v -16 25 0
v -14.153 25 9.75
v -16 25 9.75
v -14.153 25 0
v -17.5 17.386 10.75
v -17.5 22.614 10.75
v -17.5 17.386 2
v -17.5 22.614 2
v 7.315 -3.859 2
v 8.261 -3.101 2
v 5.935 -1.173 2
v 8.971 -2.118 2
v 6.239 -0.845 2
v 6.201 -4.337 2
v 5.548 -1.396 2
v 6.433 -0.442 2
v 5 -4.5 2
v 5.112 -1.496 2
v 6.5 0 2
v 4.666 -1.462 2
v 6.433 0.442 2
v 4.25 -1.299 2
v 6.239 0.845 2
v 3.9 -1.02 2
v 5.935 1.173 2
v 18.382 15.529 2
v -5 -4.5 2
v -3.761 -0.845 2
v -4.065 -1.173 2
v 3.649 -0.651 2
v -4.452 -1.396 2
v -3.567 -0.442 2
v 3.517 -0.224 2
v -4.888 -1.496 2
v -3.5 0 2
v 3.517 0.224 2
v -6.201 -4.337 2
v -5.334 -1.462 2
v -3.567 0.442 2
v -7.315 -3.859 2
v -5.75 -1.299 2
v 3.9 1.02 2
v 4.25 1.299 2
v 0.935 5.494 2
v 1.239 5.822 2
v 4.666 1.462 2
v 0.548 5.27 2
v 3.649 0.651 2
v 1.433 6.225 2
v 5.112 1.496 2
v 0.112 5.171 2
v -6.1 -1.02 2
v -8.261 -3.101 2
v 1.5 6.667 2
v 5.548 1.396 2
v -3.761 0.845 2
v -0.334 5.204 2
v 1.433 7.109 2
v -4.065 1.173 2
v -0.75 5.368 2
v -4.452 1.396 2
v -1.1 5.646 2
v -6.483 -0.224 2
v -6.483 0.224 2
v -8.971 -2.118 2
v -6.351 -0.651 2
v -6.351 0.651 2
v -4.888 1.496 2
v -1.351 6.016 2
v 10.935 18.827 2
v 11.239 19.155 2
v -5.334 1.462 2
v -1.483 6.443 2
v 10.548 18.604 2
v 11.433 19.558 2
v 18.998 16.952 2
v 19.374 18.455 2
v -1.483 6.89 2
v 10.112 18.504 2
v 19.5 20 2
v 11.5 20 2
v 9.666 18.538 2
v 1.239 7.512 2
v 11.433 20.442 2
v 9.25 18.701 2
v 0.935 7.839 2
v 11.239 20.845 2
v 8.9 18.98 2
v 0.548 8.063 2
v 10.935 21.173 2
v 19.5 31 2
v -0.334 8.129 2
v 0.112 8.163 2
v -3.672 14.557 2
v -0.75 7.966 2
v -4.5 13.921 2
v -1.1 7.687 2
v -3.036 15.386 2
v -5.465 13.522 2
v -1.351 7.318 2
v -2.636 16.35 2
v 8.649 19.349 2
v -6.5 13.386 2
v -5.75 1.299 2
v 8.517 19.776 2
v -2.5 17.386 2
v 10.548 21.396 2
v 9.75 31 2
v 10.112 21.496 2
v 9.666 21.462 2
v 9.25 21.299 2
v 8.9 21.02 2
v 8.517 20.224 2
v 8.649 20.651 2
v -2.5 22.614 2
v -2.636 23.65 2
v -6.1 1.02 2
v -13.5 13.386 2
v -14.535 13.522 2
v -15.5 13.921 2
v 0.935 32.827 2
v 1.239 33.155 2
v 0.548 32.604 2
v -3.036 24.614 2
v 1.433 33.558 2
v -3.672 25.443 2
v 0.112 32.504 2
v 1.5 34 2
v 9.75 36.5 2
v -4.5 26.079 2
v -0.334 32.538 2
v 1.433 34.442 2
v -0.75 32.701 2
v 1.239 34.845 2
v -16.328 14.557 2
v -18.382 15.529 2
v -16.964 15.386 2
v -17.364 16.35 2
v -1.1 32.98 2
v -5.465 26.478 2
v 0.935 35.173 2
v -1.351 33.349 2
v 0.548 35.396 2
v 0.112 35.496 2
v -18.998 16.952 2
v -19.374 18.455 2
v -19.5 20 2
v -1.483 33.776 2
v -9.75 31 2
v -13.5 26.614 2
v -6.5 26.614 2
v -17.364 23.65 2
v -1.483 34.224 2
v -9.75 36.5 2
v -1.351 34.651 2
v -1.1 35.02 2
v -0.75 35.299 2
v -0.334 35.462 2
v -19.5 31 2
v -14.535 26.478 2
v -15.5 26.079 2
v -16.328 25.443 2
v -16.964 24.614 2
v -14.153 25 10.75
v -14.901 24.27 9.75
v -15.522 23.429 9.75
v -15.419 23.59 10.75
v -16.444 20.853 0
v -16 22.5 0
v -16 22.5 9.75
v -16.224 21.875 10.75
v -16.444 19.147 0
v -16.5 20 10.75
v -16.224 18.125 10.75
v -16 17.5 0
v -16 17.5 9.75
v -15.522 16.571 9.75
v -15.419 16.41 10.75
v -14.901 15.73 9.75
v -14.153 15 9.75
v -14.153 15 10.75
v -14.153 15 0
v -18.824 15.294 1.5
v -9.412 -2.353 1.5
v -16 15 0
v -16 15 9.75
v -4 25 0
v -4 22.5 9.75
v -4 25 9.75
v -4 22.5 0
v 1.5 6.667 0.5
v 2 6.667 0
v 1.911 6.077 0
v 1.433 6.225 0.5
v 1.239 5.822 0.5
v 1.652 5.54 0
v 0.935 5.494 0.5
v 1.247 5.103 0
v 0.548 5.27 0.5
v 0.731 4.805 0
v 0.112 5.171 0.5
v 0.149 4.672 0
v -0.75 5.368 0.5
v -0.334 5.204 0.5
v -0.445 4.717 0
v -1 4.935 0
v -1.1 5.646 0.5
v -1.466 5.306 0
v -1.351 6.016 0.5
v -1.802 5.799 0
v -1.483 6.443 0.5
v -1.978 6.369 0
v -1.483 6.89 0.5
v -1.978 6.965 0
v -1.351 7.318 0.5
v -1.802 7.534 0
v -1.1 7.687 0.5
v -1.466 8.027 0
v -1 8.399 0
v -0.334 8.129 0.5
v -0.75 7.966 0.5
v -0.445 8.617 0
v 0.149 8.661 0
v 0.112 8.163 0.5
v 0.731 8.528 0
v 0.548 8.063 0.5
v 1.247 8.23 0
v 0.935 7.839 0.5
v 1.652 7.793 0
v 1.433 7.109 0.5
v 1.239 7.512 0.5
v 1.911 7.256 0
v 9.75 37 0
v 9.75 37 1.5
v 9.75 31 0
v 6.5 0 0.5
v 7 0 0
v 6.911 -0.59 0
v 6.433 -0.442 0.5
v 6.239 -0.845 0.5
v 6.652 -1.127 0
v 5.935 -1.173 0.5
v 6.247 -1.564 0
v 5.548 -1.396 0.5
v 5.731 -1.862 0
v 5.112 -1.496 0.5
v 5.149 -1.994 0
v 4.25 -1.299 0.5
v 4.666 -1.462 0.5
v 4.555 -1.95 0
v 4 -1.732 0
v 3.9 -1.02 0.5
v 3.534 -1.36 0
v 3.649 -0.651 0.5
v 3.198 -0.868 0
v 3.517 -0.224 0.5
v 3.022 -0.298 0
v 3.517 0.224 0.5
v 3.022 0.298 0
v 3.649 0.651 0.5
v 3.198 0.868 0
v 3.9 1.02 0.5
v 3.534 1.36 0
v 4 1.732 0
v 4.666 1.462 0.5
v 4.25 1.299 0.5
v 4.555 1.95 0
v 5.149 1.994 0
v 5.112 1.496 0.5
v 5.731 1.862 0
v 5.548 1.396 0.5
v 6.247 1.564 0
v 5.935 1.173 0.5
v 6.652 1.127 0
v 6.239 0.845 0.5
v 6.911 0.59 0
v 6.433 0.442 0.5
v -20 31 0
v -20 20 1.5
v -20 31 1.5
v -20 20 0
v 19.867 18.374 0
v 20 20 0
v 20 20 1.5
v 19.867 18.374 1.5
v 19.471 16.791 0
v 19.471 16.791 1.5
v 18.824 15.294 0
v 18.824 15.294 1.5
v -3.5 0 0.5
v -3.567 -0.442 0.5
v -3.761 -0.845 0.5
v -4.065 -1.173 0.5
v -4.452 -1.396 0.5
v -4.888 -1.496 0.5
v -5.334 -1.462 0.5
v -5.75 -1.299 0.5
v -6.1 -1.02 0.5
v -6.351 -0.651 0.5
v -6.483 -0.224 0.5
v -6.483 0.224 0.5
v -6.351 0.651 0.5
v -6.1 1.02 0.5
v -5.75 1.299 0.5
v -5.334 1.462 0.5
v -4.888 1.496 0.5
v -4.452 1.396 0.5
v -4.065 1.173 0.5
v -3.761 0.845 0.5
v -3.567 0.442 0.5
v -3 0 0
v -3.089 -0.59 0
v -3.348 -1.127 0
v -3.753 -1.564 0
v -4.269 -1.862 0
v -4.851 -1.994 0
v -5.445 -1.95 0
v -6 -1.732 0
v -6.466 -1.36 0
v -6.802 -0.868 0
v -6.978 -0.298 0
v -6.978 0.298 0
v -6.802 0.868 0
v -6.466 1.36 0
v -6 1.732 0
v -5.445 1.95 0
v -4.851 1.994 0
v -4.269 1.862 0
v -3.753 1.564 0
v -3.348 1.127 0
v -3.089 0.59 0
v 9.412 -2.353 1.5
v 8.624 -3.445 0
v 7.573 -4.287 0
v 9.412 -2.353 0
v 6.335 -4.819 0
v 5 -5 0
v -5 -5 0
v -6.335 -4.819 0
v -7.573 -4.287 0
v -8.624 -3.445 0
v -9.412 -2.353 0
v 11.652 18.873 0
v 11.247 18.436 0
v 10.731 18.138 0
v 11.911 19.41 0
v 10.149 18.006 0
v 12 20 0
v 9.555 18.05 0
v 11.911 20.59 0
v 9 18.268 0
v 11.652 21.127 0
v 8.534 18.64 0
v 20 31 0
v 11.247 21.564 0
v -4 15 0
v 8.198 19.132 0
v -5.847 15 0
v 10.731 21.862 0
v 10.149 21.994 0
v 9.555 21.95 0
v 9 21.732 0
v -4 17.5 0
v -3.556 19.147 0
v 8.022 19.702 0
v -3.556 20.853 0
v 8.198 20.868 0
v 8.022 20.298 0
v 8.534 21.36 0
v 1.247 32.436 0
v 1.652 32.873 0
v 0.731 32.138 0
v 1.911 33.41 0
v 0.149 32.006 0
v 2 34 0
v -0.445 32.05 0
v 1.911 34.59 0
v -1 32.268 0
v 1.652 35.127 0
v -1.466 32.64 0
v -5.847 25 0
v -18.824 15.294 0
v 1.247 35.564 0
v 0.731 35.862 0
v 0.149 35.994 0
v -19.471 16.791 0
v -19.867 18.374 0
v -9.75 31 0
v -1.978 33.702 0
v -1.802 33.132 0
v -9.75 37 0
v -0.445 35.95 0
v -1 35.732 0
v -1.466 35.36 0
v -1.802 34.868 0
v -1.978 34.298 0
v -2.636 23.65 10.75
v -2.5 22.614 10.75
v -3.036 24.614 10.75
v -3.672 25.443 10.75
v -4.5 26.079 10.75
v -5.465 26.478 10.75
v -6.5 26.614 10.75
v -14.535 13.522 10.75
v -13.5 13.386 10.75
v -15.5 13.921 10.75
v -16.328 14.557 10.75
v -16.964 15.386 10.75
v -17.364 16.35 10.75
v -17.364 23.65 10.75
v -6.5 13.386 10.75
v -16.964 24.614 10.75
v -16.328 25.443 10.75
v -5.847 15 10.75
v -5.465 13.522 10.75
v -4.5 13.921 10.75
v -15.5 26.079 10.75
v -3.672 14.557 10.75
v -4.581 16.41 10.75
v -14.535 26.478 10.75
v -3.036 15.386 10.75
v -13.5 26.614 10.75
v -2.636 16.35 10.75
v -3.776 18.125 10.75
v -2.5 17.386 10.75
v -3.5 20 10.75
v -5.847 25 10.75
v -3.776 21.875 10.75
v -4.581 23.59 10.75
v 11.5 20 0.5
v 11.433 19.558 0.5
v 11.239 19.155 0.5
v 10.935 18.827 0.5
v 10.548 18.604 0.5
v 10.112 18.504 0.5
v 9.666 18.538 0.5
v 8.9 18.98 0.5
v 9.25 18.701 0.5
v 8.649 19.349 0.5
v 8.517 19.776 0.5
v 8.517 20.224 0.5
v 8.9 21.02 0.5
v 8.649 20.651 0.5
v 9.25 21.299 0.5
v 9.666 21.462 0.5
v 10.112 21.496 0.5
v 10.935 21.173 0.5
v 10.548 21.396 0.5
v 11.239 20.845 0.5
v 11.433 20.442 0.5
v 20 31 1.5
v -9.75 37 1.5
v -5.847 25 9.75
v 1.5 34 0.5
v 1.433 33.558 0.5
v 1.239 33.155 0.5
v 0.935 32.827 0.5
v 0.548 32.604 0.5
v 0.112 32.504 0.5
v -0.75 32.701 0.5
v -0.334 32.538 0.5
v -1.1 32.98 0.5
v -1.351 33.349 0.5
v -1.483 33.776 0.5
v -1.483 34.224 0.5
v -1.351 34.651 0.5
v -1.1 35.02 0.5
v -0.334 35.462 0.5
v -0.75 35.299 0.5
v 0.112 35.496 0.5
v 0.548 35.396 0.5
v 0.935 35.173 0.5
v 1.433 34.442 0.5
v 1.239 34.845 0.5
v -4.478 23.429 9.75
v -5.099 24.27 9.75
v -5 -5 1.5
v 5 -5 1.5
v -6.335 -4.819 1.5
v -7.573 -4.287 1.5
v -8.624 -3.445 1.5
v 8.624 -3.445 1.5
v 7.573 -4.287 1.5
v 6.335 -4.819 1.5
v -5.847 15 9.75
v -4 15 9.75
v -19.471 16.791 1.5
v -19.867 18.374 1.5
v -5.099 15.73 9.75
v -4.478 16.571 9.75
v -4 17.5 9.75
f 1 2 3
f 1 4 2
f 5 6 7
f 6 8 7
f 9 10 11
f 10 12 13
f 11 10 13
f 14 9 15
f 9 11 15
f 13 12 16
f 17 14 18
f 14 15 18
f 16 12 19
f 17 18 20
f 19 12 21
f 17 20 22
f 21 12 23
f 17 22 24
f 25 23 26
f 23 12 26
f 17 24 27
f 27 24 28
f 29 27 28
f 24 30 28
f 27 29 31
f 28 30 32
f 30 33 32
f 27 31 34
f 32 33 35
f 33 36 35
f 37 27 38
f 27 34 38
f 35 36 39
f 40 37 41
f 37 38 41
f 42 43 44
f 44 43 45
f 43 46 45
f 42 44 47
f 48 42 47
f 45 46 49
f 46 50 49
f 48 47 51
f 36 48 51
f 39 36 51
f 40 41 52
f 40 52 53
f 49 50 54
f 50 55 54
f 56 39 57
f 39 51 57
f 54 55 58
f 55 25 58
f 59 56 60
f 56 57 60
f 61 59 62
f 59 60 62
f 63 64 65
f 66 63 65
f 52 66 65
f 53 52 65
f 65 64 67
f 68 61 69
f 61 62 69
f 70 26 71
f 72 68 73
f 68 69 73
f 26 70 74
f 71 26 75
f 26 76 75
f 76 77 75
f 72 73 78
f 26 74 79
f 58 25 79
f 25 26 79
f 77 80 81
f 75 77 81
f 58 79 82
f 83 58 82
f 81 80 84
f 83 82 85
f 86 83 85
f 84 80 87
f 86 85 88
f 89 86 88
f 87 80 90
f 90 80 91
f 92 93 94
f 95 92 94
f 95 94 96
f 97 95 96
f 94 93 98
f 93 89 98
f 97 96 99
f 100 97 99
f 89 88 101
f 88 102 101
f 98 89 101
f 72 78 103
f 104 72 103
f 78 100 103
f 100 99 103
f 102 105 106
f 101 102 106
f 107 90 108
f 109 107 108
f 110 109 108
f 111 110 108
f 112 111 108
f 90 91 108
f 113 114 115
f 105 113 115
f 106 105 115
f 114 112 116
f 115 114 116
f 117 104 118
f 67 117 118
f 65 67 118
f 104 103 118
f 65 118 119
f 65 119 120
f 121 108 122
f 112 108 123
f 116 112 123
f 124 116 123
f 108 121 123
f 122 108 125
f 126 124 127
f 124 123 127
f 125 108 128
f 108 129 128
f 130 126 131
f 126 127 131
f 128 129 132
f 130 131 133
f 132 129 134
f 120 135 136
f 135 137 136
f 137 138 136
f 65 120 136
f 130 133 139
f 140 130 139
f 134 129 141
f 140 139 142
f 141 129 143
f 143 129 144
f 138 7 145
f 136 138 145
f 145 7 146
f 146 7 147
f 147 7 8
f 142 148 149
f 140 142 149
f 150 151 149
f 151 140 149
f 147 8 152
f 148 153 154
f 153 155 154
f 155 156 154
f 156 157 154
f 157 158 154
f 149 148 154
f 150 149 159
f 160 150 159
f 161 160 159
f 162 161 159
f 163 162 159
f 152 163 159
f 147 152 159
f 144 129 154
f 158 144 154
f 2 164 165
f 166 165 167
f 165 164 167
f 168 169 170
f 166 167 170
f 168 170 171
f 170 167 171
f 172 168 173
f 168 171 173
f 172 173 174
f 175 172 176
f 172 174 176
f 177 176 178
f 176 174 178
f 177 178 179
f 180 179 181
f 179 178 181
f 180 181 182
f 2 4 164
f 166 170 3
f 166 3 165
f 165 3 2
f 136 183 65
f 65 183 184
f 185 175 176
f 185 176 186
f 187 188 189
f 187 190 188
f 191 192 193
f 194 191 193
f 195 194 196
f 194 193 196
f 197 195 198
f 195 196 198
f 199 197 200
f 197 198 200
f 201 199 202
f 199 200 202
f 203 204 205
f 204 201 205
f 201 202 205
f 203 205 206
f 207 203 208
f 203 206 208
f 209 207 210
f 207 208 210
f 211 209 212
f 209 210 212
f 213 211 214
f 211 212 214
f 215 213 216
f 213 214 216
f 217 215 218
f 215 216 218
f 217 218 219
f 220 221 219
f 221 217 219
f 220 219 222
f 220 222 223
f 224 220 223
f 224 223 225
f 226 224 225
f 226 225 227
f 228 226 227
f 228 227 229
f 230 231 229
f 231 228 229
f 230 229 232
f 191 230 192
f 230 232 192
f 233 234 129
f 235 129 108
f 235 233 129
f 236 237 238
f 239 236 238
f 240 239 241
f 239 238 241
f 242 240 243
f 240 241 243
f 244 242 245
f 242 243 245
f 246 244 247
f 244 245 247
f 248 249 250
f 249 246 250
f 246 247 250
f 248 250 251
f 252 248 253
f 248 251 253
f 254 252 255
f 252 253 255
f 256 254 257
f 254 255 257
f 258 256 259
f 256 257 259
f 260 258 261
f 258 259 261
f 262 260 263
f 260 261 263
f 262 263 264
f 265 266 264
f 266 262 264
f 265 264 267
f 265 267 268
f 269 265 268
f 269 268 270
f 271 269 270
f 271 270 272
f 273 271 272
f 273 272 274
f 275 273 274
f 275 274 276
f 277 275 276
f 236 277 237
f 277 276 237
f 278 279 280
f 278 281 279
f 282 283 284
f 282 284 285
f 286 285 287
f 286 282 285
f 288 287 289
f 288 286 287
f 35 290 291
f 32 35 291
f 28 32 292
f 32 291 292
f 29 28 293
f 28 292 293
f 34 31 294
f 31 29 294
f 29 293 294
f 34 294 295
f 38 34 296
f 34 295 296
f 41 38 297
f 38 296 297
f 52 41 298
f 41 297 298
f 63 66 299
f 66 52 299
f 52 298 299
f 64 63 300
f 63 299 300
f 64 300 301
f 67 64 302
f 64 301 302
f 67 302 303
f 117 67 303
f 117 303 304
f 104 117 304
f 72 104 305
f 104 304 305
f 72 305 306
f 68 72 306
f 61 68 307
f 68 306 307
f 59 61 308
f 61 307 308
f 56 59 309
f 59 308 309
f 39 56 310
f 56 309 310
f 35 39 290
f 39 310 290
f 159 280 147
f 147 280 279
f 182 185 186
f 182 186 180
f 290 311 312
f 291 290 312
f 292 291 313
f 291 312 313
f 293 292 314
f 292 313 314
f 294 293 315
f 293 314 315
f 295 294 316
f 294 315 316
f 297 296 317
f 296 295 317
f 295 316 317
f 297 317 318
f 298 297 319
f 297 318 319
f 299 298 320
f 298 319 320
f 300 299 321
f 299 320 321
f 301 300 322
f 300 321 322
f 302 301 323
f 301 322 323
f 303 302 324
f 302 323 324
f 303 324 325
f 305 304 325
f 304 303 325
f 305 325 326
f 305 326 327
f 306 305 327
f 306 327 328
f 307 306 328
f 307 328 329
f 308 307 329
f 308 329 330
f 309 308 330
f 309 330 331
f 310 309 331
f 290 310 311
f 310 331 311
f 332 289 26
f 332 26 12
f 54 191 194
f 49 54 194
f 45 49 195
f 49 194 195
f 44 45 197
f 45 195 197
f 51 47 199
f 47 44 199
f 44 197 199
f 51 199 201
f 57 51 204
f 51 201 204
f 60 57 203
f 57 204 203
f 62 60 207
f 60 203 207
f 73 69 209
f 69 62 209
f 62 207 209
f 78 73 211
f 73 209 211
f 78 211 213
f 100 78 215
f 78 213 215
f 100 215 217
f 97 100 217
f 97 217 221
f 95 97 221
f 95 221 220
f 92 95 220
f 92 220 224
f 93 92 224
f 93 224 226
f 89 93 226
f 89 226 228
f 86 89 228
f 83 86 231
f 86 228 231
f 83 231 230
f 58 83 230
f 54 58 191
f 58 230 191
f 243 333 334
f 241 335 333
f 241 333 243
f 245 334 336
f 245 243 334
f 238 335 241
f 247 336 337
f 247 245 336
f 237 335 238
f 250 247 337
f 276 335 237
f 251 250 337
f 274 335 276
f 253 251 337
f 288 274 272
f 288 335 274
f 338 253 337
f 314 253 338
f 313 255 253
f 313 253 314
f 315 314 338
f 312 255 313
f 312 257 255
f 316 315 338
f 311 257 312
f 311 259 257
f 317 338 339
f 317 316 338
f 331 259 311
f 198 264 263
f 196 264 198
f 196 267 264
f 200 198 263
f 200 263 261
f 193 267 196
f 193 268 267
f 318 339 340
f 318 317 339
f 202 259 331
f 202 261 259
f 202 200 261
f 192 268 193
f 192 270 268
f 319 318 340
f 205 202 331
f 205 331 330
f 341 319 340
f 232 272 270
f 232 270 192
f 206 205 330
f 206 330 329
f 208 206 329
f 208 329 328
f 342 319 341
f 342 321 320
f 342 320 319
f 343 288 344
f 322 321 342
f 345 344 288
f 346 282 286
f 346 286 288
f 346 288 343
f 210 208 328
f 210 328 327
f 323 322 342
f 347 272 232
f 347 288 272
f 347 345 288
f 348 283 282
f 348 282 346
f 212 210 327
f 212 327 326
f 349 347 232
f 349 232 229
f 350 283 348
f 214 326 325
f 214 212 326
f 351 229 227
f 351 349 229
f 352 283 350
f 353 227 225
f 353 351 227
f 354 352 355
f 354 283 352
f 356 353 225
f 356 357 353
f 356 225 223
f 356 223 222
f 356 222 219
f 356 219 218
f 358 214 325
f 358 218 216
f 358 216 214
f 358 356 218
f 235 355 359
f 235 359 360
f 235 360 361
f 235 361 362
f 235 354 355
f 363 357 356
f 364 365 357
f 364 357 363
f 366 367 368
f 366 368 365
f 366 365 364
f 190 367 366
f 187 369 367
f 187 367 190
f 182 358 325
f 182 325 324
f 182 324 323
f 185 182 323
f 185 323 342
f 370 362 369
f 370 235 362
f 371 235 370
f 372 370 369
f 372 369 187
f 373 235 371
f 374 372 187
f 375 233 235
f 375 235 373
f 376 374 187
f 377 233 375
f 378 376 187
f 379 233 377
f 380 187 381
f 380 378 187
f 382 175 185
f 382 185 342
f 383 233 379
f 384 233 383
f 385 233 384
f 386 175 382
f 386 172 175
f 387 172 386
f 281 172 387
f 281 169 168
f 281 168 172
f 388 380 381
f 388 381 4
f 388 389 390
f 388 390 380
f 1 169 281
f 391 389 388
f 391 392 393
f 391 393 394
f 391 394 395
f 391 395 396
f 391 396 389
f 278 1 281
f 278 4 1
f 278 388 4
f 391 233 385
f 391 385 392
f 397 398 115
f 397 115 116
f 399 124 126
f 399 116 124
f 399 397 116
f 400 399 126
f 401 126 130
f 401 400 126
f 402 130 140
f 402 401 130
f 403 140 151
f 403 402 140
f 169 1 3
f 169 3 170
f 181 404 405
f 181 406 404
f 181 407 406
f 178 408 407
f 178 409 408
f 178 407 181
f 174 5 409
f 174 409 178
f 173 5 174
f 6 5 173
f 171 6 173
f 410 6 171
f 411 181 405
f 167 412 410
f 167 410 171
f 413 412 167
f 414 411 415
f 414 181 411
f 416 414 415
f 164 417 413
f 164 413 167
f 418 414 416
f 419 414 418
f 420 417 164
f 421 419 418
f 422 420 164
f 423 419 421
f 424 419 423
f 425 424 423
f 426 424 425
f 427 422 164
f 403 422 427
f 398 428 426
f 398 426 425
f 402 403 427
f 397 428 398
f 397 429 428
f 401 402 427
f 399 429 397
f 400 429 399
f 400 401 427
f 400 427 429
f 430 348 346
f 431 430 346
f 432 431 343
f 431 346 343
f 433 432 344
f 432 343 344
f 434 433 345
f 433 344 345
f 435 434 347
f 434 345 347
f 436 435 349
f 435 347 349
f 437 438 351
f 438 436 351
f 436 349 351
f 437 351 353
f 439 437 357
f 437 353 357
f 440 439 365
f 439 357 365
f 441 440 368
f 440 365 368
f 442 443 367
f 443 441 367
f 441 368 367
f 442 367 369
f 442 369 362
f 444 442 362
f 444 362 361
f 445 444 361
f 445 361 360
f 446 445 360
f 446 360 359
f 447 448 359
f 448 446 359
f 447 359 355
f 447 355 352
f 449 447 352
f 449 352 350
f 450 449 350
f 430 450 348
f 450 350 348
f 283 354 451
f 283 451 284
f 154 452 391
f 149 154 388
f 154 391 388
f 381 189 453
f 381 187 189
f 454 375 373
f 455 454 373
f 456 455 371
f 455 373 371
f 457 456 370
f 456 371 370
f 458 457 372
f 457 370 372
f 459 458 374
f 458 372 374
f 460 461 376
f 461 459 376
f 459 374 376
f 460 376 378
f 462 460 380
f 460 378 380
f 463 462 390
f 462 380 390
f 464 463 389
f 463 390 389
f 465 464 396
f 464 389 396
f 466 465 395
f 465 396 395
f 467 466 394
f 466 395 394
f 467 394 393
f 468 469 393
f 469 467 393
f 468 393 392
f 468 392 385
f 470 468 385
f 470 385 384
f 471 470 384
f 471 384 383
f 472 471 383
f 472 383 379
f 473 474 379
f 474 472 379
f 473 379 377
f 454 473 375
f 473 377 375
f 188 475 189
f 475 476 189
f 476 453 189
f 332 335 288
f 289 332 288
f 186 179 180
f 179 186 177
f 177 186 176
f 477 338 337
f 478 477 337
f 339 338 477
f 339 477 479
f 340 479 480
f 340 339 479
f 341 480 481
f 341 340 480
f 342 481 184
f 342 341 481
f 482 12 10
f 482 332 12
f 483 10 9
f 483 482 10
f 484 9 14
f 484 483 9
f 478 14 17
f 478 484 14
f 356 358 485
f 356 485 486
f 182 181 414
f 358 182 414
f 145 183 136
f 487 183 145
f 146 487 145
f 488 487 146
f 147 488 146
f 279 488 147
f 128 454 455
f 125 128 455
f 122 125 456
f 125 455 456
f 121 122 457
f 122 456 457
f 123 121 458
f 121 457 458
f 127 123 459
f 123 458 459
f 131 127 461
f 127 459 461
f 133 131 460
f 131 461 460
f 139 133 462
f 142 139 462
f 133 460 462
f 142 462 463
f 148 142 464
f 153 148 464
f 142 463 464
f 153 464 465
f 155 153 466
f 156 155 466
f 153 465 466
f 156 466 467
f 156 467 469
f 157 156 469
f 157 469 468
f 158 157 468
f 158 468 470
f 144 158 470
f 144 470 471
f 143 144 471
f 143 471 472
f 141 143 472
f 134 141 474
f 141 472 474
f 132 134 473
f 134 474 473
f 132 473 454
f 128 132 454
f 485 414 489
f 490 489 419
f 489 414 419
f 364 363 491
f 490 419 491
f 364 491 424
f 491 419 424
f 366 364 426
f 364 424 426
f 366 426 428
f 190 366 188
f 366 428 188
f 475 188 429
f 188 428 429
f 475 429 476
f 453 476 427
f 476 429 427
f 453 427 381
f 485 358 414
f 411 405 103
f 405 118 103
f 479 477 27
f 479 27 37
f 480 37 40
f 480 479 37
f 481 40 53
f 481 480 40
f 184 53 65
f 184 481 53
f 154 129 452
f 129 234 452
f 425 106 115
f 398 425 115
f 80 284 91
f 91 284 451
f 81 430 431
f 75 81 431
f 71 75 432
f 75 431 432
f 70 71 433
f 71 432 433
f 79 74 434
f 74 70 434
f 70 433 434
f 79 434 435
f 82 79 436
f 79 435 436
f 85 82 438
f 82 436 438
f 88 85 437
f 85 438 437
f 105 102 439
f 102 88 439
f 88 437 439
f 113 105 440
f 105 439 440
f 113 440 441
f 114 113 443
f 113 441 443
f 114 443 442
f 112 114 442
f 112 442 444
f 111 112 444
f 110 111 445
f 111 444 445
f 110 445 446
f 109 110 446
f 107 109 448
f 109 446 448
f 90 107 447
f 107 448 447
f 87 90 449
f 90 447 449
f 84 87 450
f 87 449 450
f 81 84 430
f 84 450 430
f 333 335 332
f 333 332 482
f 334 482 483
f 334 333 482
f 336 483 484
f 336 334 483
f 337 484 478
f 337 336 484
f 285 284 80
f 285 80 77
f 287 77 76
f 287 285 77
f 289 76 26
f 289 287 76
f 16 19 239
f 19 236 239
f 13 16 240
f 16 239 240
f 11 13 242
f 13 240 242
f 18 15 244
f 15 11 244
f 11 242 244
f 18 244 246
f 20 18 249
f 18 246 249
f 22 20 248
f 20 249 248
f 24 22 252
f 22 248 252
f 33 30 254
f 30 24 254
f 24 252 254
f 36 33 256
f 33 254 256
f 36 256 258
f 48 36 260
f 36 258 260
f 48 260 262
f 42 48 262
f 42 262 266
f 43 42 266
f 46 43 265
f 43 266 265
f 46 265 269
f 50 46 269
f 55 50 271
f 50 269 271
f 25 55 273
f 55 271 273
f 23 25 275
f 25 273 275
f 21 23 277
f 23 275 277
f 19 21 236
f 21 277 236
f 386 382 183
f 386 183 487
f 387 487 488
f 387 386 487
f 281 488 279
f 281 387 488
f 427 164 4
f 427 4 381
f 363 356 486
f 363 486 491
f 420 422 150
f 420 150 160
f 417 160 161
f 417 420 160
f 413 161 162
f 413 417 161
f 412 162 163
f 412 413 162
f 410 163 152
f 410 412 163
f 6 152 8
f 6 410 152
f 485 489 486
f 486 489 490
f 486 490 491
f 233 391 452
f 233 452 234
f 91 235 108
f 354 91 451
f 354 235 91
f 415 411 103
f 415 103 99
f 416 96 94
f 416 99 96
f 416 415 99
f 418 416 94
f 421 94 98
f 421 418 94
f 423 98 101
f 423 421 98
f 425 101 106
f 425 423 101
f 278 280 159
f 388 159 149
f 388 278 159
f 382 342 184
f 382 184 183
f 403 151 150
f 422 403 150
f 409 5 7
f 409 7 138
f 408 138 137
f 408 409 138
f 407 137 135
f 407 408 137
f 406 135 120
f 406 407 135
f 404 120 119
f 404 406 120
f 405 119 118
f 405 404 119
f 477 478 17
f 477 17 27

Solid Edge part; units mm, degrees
sketch "Sketch1" plane through (0, 0, 0) normal (0, 0, 1) x (1, 0, 0)
  line L0 (-9.4118, -2.3529) -> (-18.8235, 15.2941)
  arc A0 (-18.8235, 15.2941) -> (-20, 20) centre (-10, 20) cw
  line L1 (-20, 20) -> (-20, 31)
  line L2 (-20, 31) -> (-9.75, 31)
  line L3 (-9.75, 37) -> (-9.75, 31)
  line L4 (-9.75, 37) -> (9.75, 37)
  line L5 (9.75, 37) -> (9.75, 31)
  line L6 (9.75, 31) -> (20, 31)
  line L7 (20, 31) -> (20, 20)
  arc A1 (20, 20) -> (18.8235, 15.2941) centre (10, 20) cw
  line L8 (9.4118, -2.3529) -> (18.8235, 15.2941)
  line L9 (-5, -5) -> (5, -5)
  arc A2 (9.4118, -2.3529) -> (5, -5) centre (5, 0) cw
  arc A3 (-5, -5) -> (-9.4118, -2.3529) centre (-5, 0) cw
  circle A4 centre (10, 20) radius 1.5
  circle A5 centre (5, 0) radius 1.5
  circle A6 centre (-5, 0) radius 1.5
  circle A7 centre (0, 6.6667) radius 1.5
extrude "Protrusion1" add sketch "Sketch1" along normal blind 2
sketch "Sketch2" plane through (0, 0, 0) normal (0, 0, 1) x (1, 0, 0)
  line L0 (-17.5, 26.6144) -> (-17.5, 13.3856)
  line L1 (-17.5, 13.3856) -> (-2.5, 13.3856)
  line L2 (-2.5, 13.3856) -> (-2.5, 26.6144)
  line L3 (-2.5, 26.6144) -> (-17.5, 26.6144)
extrude "Protrusion2" add sketch "Sketch2" along normal blind 10.75
sketch "Sketch3" plane through (0, 0, 0) normal (0, 0, 1) x (1, 0, 0)
  line L0 (-16, 25) -> (-16, 15)
  line L1 (-16, 15) -> (-4, 15)
  line L2 (-4, 15) -> (-4, 25)
  line L3 (-4, 25) -> (-16, 25)
extrude "VaciadoExtruido_2" cut sketch "Sketch3" along normal blind 9.75
sketch "Sketch4" plane through (-10, 20, 10.75) normal (0, 0, 1) x (1, 0, 0)
  line L0 (-4.1533, 5) -> (4.1533, 5)
  arc A0 (4.1533, 5) -> (4.1533, -5) centre (0, 0) cw
  line L1 (-4.1533, -5) -> (4.1533, -5)
  arc A1 (-4.1533, -5) -> (-4.1533, 5) centre (0, 0) cw
extrude "Cutout1" cut sketch "Sketch4" against normal through all
fillet "Redondeo_1" radius 4 4 edges at (-2.5, 13.3856, 6.375) (-17.5, 13.3856, 6.375) (-17.5, 26.6144, 6.375) (-2.5, 26.6144, 6.375)
chamfer "Chaflán_1" distance 0.5 angle 45 10 edges at (0, -5, 2) (-7.5725, -4.2875, 2) (-14.1176, 6.4706, 2) (14.1176, 6.4706, 2) (7.5725, -4.2875, 2) (19.7014, 17.5746, 2) (20, 25.5, 2) (-19.7014, 17.5746, 2) (-20, 25.5, 2) (0, 37, 2)
sketch "Sketch5" plane through (0, 0, 0) normal (0, 0, 1) x (1, 0, 0)
  circle A0 centre (0, 34) radius 1.5
extrude "Cutout2" cut sketch "Sketch5" along normal through all
chamfer "Chaflán_2" distance 0.5 angle 45 4 edges at (8.5, 20, 0) (3.5, 0, 0) (-6.5, 0, 0) (-1.5, 34, 0)
chamfer "Chaflán_3" distance 0.5 angle 45 1 edges at (-1.5, 6.6667, 0)
